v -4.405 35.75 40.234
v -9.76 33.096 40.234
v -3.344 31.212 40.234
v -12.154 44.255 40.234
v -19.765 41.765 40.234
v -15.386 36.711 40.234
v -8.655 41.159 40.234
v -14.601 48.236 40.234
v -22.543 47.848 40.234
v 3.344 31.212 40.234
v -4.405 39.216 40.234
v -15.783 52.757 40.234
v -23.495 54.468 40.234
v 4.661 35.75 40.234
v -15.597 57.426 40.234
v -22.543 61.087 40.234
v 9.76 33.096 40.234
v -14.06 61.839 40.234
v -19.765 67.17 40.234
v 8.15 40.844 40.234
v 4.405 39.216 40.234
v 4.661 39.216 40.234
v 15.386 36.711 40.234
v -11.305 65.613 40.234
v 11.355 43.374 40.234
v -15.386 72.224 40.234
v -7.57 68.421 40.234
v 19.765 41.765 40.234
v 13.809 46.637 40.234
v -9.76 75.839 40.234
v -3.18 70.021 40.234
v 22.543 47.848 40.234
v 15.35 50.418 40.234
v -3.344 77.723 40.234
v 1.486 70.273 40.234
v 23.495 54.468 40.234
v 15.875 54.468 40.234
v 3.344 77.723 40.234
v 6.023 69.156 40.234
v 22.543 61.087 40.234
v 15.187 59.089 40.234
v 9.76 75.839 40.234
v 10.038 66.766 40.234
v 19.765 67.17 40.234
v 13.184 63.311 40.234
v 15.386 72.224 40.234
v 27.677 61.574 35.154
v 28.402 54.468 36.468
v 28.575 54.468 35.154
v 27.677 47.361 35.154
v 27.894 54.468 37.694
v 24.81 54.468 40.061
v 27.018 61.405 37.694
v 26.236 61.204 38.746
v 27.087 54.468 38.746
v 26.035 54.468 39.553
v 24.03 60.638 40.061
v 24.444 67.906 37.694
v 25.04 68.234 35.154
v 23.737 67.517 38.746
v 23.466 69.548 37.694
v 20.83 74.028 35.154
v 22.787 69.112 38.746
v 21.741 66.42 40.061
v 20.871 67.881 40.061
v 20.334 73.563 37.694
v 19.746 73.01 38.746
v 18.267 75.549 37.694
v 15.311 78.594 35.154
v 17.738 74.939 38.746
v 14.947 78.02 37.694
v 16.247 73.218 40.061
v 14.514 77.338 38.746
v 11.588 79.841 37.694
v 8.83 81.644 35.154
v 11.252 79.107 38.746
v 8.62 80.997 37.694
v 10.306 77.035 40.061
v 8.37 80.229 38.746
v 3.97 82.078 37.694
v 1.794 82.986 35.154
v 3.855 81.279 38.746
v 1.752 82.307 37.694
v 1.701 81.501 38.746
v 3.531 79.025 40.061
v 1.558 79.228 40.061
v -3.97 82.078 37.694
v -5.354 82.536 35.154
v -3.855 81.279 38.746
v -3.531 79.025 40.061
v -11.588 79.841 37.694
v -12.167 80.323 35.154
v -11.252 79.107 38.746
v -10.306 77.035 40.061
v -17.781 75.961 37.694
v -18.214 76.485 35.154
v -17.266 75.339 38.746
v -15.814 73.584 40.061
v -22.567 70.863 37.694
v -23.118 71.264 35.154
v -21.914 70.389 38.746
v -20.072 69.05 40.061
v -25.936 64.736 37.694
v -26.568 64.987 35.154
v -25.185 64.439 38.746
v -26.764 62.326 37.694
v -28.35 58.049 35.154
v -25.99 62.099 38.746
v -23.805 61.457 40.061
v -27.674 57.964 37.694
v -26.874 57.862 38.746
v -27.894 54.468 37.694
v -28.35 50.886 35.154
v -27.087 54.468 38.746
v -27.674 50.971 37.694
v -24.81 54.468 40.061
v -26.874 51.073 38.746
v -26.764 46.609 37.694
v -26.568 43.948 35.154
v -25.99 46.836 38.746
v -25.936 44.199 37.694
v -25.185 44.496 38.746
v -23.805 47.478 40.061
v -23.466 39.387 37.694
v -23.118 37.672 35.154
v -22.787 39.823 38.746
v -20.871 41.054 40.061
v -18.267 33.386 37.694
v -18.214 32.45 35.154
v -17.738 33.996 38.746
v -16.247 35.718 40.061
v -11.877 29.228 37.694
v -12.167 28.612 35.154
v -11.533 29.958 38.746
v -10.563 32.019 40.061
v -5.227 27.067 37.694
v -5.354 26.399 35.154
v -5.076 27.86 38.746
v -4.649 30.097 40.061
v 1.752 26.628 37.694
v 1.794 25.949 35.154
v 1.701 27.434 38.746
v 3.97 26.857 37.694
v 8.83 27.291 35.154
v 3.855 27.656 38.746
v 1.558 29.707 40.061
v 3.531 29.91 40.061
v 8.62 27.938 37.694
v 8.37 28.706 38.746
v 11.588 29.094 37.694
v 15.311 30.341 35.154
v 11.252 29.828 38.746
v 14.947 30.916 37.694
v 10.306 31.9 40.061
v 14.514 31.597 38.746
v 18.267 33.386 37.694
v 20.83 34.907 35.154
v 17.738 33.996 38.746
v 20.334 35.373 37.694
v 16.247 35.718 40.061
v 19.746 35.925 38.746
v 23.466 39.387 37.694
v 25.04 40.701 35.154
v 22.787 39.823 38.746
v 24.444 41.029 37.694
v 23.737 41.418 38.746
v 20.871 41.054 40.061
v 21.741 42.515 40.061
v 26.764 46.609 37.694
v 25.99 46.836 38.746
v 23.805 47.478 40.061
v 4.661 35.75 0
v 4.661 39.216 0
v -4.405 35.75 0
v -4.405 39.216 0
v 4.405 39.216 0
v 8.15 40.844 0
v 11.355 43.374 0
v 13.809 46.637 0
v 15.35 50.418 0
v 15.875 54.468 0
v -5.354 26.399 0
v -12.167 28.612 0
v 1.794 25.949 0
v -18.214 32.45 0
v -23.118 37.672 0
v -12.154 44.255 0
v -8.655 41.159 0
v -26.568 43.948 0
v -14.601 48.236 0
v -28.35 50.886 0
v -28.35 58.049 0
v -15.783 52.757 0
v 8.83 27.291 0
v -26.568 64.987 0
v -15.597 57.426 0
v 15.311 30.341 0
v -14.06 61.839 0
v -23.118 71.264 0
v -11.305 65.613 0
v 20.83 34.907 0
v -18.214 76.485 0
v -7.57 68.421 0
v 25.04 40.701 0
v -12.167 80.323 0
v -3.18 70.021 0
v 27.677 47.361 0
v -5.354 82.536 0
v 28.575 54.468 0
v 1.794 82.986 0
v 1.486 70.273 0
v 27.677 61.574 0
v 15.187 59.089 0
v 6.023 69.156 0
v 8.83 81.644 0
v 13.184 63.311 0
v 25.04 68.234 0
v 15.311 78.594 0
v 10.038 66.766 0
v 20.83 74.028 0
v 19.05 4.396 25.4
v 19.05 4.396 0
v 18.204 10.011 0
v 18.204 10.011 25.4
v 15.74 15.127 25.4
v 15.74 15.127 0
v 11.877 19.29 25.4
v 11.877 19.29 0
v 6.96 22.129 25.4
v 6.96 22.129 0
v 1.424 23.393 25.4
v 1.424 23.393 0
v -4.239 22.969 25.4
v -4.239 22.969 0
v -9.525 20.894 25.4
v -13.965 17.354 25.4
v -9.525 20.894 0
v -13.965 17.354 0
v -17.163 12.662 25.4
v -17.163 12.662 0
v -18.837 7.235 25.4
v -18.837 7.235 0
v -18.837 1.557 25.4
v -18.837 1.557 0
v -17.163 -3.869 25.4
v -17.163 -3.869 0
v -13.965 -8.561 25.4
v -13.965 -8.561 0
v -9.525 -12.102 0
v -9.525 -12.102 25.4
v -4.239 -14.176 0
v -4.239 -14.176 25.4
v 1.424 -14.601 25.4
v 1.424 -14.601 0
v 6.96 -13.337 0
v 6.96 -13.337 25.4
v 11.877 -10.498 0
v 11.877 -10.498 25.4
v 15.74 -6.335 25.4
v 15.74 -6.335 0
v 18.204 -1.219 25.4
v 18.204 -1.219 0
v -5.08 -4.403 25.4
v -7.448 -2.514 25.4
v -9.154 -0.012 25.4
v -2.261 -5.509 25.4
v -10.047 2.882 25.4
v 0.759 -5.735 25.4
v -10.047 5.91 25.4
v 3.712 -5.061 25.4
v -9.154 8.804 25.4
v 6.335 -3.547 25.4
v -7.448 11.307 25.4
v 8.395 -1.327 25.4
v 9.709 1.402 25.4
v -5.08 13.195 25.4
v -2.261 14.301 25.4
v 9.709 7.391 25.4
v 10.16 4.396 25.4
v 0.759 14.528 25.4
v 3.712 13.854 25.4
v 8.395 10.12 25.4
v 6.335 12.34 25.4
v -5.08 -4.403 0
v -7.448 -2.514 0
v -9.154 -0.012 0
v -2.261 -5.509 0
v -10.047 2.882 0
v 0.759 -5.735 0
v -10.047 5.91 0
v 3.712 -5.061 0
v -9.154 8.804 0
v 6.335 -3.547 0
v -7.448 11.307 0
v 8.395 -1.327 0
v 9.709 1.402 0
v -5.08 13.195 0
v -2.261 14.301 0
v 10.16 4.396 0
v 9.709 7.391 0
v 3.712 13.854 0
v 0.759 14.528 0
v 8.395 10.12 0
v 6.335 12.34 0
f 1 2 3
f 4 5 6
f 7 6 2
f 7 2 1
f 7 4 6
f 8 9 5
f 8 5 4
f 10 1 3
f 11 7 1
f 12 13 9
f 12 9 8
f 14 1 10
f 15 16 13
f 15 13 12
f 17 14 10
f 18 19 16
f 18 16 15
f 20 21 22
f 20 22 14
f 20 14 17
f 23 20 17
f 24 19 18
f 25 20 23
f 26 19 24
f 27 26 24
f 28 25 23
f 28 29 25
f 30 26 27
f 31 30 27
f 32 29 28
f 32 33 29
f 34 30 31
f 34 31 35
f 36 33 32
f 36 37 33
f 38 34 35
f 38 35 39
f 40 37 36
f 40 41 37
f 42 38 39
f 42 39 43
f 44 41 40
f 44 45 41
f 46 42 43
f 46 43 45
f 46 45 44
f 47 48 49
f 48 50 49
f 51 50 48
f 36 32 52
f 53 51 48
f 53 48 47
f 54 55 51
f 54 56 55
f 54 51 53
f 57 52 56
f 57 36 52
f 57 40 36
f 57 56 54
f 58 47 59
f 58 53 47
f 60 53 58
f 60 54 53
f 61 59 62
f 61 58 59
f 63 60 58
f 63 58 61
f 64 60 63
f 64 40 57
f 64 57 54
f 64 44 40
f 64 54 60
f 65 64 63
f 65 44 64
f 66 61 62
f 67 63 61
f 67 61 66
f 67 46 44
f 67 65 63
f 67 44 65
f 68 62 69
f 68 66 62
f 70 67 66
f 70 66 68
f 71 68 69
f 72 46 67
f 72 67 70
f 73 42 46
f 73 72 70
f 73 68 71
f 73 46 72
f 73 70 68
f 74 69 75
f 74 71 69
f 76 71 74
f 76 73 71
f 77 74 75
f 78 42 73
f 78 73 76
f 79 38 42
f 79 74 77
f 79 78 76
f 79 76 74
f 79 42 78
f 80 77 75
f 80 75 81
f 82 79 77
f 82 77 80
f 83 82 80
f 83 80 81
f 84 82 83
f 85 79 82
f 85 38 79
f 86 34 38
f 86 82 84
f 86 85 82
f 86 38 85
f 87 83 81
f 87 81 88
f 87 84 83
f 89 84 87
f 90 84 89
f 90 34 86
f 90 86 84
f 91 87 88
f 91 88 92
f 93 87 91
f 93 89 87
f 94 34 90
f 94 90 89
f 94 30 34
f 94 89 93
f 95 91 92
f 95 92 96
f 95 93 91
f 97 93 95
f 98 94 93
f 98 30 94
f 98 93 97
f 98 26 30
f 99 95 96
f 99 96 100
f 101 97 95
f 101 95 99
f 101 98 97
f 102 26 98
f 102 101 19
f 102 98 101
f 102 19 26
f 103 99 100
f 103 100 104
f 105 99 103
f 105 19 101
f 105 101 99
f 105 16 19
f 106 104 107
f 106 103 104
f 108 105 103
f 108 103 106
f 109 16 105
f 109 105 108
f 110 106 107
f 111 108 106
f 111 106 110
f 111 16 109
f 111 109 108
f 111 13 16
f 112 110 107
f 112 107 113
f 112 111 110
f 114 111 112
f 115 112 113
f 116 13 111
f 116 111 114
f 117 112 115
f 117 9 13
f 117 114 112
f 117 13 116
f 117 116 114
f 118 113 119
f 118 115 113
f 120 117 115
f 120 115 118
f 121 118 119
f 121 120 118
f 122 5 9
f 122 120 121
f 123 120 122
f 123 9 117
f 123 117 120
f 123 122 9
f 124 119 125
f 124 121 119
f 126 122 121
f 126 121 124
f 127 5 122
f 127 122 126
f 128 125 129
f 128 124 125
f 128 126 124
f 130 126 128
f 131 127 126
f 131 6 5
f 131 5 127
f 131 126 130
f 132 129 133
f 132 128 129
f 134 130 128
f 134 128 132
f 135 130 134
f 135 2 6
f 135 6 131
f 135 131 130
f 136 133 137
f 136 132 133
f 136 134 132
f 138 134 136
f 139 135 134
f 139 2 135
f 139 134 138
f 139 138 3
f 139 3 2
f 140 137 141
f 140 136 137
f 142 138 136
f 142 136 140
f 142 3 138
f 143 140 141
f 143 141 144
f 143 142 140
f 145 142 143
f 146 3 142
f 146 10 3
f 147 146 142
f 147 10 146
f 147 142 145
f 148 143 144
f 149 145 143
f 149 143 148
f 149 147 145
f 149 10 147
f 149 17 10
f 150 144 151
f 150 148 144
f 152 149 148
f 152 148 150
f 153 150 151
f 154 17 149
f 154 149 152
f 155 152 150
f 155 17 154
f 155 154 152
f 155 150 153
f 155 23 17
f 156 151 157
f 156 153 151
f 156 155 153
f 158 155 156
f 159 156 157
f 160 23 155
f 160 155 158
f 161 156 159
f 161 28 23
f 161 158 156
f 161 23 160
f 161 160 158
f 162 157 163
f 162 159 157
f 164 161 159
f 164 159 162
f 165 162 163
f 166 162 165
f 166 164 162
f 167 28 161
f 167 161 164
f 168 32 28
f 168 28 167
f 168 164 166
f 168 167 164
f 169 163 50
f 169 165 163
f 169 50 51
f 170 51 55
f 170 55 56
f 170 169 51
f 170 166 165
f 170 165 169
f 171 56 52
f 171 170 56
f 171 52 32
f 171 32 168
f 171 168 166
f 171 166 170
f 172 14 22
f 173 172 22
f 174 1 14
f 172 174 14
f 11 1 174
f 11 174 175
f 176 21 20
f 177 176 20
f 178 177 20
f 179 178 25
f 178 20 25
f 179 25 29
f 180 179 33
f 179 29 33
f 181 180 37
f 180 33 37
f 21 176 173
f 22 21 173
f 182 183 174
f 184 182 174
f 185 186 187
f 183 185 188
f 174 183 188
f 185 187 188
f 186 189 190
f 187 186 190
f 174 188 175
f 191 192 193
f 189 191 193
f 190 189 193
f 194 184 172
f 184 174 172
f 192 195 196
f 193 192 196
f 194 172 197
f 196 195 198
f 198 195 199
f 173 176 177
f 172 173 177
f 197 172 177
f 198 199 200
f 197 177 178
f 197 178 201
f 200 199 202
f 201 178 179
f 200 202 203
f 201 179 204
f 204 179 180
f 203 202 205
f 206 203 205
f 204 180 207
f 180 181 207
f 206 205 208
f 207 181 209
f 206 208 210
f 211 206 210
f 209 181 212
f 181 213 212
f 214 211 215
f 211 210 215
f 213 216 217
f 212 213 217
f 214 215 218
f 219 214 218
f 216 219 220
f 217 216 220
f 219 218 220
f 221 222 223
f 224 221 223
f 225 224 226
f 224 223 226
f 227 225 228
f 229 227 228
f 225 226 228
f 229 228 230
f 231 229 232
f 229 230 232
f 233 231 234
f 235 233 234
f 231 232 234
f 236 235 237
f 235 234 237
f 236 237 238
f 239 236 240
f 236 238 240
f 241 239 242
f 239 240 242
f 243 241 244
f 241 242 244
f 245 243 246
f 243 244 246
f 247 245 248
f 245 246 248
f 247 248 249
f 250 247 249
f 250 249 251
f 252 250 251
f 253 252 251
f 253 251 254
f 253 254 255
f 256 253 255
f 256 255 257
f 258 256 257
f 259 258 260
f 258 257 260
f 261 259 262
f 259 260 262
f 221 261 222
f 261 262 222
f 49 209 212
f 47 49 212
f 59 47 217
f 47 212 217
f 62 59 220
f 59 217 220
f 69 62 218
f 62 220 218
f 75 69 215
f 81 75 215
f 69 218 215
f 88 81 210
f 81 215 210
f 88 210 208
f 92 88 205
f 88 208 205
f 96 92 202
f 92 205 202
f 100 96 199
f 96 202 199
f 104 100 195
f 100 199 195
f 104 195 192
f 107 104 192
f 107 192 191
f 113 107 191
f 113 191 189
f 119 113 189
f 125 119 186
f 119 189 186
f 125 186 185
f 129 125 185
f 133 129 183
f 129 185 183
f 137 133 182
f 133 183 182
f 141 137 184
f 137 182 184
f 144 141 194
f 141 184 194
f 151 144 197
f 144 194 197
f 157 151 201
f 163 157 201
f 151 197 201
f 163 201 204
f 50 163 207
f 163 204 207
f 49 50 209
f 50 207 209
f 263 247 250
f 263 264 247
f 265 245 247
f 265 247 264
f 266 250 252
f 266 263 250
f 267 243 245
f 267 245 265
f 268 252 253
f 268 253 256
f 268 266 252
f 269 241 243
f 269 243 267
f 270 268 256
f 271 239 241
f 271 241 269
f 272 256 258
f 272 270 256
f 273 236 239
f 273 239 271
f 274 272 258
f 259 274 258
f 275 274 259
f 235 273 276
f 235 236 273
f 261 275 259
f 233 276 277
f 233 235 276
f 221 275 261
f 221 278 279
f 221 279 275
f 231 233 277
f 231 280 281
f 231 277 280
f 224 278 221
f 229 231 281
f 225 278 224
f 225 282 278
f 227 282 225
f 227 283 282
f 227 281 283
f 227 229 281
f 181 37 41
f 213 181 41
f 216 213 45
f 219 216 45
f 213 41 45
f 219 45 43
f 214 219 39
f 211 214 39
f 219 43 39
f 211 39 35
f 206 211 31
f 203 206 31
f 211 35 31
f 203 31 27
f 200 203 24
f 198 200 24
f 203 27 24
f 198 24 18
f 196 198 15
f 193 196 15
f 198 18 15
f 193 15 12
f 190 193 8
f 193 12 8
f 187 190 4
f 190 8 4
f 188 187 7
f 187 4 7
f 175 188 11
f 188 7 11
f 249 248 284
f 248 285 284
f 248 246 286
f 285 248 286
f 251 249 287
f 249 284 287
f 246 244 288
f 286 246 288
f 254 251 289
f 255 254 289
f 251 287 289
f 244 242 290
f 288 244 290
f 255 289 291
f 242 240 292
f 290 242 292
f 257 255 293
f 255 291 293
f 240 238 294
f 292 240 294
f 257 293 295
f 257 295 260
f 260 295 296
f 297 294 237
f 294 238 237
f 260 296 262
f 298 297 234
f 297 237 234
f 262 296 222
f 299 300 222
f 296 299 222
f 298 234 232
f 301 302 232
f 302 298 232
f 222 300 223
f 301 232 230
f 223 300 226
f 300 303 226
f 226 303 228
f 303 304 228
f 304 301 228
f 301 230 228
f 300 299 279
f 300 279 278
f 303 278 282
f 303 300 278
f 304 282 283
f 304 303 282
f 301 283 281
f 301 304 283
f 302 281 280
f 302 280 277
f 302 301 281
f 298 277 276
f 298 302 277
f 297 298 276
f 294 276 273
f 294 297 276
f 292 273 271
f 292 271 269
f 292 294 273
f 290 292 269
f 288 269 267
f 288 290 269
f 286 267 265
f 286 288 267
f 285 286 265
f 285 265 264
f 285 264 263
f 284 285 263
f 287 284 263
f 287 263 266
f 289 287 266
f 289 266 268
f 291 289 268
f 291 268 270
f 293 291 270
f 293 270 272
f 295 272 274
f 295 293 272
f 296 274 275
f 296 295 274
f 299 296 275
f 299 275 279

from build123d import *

# Parameters (mm, degrees)
F0_R     = 28.575
F1_DEPTH = 40.2336
F2_R     = 5.08
F4_DEPTH = 50.8
F5_W     = 9.066426
F5_H     = 3.466468
F6_DEPTH = 50.8
F7_R     = 19.05
F7_R_2   = 10.16
F8_DEPTH = 25.4


with BuildPart() as f1:
    # F0 (on Top) → F1 (new body)
    with BuildSketch(Plane.XY):
        with Locations((0, 54.467562)):
            Circle(F0_R)
    extrude(amount=F1_DEPTH)

    # F2
    f2_edges = [f1.edges().sort_by_distance(p)[0] for p in [
        (-28.575, 54.467562, 40.2336),
    ]]
    fillet(f2_edges, radius=F2_R)

    # F3 (on face) → F4 (cut)
    with BuildSketch(Plane.XY.offset(40.2336)):
        with BuildLine():
            ThreePointArc((4.405142, 39.215993), (12.687538, 44.925969), (15.875, 54.467562))
            ThreePointArc((15.875, 54.467562), (-9.541593, 67.1551), (-4.405142, 39.215993))
            Line((-4.405142, 39.215993), (4.405142, 39.215993))
        make_face()
    extrude(amount=-F4_DEPTH, mode=Mode.SUBTRACT)

    # F5 (on face) → F6 (cut)
    with BuildSketch(Plane.XY.offset(40.2336)):
        with Locations((0.128071, 37.482759)):
            Rectangle(F5_W, F5_H)
    extrude(amount=-F6_DEPTH, mode=Mode.SUBTRACT)


with BuildPart() as f8:
    # F7 (on Top) → F8 (new body)
    with BuildSketch(Plane.XY):
        with Locations((0, 4.396227)):
            Circle(F7_R)
        with Locations((0, 4.396227)):
            Circle(F7_R_2, mode=Mode.SUBTRACT)
    extrude(amount=F8_DEPTH)


solid = Compound([f1.part, f8.part])
